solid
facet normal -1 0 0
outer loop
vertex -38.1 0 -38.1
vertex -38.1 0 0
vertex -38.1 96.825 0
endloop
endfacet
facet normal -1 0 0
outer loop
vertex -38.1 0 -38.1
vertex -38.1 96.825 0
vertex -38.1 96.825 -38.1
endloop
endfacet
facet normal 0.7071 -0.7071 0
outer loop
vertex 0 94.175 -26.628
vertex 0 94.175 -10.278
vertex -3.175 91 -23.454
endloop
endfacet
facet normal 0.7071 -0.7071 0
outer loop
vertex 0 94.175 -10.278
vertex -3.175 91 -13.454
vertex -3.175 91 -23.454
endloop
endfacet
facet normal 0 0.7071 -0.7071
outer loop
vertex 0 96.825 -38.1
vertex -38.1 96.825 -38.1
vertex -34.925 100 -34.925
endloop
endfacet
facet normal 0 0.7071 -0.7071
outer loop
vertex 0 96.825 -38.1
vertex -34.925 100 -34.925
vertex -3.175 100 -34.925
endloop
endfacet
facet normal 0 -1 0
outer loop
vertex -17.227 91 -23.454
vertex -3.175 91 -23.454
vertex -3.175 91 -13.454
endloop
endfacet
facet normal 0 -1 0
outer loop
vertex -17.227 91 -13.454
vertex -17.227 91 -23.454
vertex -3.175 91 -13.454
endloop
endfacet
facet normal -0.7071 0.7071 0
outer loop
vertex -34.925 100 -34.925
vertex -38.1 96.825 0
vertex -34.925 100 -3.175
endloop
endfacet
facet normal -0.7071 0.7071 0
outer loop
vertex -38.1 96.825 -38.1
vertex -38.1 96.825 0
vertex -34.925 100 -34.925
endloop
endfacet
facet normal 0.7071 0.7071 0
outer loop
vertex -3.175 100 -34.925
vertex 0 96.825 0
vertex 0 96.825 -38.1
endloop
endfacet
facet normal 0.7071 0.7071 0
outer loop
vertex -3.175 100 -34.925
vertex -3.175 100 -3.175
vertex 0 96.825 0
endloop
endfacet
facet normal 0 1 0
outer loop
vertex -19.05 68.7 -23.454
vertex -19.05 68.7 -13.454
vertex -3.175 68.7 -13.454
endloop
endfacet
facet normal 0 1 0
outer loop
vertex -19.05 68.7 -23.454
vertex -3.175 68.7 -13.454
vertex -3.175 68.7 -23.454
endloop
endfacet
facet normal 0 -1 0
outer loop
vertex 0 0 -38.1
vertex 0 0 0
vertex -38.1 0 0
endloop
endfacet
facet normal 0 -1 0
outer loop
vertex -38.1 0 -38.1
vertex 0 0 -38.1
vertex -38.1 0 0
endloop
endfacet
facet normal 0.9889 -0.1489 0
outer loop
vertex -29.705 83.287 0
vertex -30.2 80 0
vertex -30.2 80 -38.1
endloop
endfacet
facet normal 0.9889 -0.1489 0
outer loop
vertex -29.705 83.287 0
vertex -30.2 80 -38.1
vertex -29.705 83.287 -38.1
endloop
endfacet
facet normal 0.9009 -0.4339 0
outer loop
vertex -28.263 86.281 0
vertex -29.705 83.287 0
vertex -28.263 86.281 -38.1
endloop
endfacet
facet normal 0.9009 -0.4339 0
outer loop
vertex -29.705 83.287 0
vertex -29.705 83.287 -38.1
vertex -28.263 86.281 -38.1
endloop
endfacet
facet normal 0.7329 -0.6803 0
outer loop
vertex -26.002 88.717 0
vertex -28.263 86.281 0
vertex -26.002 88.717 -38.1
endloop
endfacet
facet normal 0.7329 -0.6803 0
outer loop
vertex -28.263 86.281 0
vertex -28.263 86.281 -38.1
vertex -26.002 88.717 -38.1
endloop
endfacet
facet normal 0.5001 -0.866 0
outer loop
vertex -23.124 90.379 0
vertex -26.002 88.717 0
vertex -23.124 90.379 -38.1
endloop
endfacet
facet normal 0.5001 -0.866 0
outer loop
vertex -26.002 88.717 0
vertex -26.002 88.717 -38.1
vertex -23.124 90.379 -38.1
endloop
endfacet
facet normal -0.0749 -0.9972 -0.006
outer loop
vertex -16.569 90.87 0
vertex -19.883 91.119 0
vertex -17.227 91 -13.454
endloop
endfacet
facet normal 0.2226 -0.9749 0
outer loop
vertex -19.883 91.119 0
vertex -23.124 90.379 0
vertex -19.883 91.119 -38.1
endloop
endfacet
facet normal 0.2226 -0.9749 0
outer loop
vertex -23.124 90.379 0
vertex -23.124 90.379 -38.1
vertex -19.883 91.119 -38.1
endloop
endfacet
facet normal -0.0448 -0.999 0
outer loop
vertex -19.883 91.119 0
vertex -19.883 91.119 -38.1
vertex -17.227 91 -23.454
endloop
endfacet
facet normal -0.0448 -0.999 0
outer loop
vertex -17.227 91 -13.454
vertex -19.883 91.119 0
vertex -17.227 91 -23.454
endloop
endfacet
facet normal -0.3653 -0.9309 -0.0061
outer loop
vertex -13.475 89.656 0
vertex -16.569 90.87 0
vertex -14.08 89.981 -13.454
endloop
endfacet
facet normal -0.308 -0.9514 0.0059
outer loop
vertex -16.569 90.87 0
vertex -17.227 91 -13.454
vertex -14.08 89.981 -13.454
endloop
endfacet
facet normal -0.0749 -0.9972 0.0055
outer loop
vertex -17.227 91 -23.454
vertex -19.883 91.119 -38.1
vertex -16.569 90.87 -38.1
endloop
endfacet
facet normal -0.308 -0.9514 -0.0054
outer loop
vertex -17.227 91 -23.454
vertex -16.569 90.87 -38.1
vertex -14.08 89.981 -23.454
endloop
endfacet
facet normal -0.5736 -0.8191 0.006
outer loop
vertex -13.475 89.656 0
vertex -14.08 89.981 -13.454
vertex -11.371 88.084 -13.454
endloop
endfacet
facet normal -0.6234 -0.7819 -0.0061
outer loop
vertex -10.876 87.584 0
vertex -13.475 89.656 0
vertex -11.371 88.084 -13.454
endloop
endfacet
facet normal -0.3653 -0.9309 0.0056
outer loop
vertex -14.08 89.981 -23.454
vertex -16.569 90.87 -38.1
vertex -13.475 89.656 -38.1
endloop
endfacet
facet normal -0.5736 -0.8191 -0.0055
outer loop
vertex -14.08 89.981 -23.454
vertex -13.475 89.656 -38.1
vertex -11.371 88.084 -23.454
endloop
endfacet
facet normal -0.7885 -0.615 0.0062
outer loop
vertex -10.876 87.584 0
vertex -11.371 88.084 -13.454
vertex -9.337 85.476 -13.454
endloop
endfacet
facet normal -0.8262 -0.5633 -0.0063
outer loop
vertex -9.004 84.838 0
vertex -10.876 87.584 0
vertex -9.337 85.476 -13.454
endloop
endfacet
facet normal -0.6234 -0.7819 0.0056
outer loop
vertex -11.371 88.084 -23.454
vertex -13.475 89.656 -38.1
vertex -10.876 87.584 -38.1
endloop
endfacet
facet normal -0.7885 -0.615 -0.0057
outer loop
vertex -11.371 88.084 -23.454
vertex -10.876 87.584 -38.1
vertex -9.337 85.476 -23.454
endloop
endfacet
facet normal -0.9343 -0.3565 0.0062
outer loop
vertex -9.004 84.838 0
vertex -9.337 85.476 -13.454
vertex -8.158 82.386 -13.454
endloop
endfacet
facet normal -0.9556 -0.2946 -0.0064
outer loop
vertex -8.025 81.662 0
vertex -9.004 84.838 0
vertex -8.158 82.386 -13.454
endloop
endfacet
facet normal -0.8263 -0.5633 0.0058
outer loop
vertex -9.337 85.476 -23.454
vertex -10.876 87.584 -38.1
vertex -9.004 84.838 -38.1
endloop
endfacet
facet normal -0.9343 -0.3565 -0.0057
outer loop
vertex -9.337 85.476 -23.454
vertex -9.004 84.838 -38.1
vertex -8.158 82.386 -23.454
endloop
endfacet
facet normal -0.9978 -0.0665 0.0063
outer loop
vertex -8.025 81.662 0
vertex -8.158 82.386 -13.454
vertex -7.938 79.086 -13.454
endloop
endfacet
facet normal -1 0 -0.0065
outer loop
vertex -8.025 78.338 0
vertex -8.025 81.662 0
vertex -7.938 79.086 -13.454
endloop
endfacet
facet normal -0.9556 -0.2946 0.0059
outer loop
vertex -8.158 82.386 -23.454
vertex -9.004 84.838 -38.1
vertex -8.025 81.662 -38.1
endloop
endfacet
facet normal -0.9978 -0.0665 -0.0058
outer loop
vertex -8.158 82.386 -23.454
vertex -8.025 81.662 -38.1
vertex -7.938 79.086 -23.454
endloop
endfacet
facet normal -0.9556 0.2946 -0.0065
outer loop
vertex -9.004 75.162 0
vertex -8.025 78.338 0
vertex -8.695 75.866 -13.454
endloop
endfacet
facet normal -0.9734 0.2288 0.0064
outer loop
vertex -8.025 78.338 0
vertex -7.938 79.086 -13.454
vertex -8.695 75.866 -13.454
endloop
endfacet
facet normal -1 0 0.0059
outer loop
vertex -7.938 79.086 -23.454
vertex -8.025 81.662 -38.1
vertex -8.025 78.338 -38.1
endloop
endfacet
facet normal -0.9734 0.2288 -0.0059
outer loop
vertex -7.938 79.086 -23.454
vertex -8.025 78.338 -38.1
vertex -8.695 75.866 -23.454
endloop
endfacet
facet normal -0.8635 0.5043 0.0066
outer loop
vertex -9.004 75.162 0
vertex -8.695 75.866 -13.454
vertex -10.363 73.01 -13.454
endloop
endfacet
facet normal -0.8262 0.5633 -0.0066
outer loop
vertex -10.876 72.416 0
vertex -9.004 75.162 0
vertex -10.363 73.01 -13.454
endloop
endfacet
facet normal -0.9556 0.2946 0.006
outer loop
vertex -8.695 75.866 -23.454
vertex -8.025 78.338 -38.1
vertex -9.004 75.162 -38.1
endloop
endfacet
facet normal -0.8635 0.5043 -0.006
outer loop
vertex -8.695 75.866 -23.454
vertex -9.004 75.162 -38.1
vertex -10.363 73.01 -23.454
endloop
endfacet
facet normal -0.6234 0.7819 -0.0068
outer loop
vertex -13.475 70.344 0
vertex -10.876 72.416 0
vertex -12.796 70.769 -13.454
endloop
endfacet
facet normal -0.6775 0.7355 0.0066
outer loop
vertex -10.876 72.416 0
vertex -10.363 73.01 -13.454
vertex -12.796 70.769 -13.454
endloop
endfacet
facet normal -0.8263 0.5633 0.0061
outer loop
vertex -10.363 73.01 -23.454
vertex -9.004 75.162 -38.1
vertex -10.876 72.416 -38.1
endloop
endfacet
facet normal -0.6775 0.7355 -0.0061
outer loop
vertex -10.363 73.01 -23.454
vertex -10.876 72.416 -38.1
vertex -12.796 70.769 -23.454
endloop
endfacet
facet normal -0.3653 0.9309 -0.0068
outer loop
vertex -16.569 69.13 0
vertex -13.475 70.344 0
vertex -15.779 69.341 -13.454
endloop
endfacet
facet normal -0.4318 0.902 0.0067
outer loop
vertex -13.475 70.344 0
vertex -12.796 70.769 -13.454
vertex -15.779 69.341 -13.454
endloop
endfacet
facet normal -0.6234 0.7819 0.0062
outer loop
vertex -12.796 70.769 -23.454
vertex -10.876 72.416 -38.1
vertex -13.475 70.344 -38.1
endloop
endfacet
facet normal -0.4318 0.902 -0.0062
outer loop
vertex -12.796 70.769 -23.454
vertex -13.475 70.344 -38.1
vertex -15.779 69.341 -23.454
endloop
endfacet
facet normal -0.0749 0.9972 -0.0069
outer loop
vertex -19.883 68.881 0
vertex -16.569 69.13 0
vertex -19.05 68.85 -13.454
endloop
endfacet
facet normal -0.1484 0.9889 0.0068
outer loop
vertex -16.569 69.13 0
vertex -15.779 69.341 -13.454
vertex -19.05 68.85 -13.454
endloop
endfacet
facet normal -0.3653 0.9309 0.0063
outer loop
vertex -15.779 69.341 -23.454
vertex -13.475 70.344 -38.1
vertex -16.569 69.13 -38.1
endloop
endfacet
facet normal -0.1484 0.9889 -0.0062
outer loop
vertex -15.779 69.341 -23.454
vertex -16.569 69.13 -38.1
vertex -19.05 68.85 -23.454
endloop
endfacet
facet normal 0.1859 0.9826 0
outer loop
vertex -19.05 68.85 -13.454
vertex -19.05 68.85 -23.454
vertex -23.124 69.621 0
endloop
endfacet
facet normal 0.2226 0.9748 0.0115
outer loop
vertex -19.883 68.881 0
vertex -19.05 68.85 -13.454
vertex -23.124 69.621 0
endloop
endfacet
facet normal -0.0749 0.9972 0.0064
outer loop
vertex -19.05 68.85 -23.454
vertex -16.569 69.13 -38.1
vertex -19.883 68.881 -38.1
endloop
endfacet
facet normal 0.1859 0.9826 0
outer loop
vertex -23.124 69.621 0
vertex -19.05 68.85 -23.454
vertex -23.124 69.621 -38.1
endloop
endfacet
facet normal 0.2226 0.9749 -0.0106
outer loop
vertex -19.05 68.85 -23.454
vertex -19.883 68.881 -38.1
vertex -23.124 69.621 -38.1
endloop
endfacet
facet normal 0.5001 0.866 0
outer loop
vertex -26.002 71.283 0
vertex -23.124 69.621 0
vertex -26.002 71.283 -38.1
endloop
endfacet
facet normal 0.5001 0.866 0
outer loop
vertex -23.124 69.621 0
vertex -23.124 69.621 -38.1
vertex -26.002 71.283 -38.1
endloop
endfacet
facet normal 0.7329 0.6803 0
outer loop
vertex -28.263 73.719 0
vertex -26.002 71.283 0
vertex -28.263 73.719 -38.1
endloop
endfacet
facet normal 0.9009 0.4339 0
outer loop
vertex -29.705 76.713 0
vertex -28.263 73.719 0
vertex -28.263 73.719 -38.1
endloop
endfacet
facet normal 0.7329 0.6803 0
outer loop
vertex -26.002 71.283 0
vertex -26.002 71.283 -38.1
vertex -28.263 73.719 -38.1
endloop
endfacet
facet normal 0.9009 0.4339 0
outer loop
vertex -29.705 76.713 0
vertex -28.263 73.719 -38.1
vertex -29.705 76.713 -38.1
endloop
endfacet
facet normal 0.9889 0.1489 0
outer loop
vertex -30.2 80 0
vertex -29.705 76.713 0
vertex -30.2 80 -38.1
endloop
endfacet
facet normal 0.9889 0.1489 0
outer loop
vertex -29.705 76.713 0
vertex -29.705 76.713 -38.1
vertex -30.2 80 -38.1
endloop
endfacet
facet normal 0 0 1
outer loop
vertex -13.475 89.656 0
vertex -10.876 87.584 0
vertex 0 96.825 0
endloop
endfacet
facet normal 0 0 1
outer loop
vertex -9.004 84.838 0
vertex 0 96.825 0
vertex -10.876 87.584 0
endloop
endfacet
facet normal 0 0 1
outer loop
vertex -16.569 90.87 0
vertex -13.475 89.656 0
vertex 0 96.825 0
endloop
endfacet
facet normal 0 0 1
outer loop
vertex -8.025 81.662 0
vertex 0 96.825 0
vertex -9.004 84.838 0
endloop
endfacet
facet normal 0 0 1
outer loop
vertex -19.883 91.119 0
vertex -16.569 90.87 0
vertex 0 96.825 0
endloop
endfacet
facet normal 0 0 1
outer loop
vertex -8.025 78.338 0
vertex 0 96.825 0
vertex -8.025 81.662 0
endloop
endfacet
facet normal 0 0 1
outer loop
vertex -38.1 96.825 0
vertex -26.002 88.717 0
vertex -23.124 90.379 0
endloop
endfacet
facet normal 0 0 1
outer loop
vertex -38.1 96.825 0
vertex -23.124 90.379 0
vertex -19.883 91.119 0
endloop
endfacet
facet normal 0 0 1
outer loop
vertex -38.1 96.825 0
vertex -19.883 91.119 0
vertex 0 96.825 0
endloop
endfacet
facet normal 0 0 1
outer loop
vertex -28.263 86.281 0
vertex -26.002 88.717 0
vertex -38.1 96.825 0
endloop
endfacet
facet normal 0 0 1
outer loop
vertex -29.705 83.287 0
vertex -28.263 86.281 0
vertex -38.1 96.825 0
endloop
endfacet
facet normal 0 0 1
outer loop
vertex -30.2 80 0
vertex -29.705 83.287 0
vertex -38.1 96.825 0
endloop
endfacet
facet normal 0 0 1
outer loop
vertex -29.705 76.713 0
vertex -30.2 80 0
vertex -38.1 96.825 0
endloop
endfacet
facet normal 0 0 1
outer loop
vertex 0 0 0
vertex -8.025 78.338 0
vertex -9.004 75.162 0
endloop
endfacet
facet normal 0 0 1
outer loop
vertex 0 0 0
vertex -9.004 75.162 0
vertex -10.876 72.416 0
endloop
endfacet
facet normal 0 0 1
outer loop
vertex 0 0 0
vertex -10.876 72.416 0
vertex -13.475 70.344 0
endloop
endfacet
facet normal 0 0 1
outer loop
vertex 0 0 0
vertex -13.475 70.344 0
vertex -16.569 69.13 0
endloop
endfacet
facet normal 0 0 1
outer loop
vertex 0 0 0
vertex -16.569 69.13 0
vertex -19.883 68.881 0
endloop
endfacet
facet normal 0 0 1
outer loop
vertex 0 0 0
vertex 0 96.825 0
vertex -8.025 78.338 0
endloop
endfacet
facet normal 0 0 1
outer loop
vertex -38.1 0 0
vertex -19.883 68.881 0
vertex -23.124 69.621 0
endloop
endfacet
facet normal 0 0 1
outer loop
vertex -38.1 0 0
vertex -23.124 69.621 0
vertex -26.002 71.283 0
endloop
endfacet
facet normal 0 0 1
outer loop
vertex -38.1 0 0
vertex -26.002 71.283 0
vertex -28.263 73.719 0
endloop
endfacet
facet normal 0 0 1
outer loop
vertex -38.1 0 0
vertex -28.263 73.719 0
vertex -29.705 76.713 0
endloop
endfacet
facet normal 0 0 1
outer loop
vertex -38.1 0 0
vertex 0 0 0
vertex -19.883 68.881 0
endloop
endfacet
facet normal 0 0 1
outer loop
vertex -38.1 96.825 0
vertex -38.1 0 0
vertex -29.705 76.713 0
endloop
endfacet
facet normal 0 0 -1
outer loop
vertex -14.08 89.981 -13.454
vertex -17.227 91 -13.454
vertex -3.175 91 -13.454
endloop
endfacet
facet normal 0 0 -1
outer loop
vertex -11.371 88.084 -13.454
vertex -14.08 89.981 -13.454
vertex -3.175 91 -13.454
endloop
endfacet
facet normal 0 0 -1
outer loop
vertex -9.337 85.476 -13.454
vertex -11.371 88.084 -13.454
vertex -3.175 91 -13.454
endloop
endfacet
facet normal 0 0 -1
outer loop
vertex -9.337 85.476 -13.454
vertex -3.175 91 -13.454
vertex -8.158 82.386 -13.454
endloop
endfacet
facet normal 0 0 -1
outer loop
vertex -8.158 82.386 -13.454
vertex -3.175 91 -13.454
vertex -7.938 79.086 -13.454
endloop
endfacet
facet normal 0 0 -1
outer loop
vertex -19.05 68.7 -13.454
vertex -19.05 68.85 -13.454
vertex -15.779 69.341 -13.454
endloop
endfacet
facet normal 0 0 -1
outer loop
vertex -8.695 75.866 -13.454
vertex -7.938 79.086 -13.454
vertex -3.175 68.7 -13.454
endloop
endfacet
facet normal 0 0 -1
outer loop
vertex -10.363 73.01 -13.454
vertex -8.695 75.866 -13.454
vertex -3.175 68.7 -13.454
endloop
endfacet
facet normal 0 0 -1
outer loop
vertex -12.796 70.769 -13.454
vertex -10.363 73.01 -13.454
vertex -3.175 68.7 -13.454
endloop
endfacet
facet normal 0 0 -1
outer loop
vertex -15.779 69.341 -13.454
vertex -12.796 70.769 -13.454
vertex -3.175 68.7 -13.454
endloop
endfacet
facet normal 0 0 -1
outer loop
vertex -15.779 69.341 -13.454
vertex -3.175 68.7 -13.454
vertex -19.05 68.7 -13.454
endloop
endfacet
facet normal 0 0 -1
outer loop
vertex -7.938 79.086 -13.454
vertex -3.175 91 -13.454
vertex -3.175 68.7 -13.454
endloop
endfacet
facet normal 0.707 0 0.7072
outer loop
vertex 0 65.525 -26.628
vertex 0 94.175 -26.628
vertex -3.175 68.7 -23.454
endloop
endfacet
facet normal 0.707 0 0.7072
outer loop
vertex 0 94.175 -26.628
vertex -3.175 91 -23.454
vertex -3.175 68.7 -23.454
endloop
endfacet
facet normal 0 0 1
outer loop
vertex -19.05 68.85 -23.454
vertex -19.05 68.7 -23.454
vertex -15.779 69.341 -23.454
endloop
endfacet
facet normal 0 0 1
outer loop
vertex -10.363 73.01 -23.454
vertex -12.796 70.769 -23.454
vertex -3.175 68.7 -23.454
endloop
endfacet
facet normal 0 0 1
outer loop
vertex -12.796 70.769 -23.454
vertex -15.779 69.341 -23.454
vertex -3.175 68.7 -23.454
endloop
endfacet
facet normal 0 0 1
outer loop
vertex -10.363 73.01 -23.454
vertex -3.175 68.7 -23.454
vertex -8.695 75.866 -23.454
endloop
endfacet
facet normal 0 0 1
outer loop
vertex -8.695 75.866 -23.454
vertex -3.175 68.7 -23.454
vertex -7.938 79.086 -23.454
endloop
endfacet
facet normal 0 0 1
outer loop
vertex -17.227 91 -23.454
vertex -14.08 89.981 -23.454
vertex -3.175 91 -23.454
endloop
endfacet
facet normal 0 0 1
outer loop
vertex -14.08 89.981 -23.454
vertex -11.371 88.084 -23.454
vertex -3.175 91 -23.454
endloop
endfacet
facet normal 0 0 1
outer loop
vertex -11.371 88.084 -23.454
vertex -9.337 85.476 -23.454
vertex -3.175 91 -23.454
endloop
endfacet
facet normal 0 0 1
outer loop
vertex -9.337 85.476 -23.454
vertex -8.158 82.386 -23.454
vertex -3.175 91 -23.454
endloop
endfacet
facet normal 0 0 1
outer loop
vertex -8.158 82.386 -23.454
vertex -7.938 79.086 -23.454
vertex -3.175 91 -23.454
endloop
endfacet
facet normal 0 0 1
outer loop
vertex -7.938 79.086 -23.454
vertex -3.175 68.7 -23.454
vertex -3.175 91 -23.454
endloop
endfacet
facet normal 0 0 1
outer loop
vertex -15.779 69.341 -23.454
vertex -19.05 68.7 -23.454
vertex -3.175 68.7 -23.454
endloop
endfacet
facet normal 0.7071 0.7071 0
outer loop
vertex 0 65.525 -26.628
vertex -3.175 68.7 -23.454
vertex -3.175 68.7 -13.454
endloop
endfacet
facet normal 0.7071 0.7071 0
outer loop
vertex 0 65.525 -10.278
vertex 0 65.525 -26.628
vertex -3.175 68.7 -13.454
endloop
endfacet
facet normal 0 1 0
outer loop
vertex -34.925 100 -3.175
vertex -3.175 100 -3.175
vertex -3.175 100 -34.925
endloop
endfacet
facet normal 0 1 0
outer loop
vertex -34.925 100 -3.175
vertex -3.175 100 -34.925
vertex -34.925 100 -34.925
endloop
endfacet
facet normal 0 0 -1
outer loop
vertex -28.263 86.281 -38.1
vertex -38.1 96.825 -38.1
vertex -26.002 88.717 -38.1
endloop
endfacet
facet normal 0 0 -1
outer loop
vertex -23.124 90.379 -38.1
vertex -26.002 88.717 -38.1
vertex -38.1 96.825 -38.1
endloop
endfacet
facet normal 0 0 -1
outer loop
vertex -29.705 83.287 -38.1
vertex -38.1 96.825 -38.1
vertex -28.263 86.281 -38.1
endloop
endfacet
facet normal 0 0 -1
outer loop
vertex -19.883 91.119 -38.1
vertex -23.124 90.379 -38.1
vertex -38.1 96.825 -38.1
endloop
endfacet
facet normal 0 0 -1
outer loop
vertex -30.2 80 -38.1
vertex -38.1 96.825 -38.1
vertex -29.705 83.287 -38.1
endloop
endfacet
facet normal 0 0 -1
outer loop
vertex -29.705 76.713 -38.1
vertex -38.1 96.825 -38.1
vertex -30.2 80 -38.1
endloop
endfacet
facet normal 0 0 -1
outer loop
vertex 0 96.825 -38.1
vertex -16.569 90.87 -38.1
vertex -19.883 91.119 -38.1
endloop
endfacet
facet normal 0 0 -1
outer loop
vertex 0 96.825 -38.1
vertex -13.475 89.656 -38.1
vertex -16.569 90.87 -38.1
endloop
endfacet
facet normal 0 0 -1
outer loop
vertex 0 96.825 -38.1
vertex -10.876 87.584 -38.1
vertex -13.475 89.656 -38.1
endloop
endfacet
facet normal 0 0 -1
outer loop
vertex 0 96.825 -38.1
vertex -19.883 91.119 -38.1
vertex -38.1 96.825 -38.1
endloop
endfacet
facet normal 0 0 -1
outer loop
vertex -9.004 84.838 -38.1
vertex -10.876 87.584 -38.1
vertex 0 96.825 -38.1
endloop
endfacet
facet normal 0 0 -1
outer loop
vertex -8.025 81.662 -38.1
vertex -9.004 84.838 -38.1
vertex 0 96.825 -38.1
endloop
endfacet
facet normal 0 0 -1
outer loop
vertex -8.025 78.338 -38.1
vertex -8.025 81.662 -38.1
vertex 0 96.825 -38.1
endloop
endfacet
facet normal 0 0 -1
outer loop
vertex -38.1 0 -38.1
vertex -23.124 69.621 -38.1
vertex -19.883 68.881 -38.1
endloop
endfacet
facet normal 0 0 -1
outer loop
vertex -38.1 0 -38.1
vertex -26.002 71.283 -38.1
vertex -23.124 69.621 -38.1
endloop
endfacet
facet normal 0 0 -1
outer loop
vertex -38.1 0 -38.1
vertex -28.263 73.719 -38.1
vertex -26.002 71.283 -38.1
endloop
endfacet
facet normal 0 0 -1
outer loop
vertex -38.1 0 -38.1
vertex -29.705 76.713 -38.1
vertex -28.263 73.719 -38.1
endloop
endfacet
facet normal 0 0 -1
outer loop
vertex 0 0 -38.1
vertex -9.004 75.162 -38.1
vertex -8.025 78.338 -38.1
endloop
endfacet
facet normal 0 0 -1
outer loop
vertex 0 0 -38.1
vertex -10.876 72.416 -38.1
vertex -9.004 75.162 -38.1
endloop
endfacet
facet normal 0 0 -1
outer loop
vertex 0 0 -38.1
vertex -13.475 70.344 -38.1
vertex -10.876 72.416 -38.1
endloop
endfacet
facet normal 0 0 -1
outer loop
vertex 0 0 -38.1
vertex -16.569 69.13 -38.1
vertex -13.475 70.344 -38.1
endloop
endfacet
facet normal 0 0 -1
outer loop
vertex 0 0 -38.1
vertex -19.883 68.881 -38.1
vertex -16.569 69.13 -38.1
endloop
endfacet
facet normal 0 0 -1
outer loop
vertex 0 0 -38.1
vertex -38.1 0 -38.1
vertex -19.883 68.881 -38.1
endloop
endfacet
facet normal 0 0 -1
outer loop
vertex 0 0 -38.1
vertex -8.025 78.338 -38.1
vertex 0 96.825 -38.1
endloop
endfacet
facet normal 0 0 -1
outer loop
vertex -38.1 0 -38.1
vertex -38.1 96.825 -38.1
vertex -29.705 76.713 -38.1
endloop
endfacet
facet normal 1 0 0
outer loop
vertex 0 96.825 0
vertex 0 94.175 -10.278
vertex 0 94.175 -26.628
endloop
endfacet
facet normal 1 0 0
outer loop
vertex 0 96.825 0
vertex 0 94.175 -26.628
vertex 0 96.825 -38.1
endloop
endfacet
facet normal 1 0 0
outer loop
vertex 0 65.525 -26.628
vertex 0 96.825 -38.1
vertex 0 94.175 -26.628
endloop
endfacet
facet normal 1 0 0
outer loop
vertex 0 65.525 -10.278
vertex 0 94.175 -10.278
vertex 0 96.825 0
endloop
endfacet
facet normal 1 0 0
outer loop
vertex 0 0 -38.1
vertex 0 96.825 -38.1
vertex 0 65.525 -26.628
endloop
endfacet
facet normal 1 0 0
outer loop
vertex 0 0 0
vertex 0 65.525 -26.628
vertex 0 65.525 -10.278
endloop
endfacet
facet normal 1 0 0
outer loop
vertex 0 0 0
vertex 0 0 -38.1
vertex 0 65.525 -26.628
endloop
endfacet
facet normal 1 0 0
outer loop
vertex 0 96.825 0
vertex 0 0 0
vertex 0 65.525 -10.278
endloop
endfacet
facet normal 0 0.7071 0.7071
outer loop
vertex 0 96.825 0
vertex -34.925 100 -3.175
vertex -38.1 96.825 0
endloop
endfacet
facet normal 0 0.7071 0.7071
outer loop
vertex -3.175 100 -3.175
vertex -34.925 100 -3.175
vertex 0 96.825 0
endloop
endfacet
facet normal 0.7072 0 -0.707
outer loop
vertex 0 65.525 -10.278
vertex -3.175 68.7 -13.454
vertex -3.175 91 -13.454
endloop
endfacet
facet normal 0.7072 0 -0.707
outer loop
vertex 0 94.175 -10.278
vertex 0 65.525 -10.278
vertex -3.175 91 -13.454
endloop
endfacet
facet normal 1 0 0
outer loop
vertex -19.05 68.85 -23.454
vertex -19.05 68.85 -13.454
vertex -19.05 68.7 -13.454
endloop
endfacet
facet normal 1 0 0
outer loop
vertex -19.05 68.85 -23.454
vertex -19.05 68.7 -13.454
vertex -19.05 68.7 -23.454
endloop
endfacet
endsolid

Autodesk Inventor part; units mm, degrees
ref_plane "YZ Plane" through (0, 0, 0) normal (1, 0, 0) x (0, 1, 0)
ref_plane "XZ Plane" through (0, 0, 0) normal (0, 1, 0) x (-1, 0, 0)
ref_plane "XY Plane" through (0, 0, 0) normal (0, 0, 1) x (1, 0, 0)
sketch "Sketch1" plane through (0, 0, 0) normal (0, 1, 0) x (-1, 0, 0)
  line L0 (0, 0) -> (38.1, 0)
  line L1 (38.1, 0) -> (38.1, -38.1)
  line L2 (38.1, -38.1) -> (0, -38.1)
  line L3 (0, -38.1) -> (0, 0)
  dimension "d0" = 38.1
  dimension "d1" = 38.1
extrude "Extrusion1" add sketch "Sketch1" along normal blind 100
sketch "Sketch2" plane through (0, 0, -38.1) normal (0, 0, -1) x (-1, 0, 0)
  circle A0 centre (19.05, 80) radius 11.15
  line L0 (0, 100) -> (38.1, 100) projected
  line L1 (0, 0) -> (0, 100) projected
  dimension "d4" = 22.3
  dimension "d5" = 20
  dimension "d6" = 19.05
sketch "Sketch3" plane through (0, 0, -38.1) normal (0, 0, -1) x (-1, 0, 0)
  point P0 (0, 0)
extrude "Extrusion2" cut sketch "Sketch2" against normal blind 38.1
sketch "Sketch4" plane through (0, 0, 0) normal (1, 0, 0) x (0, 0, -1)
  line L0 (13.4535, 68.7) -> (23.4535, 68.7)
  line L1 (23.4535, 68.7) -> (23.4535, 91)
  line L2 (23.4535, 91) -> (13.4535, 91)
  line L3 (13.4535, 91) -> (13.4535, 68.7)
  line L4 (13.4535, 68.7) -> (23.4535, 91) construction
  line L5 (23.4535, 68.7) -> (13.4535, 91) construction
  line L6 (0, 100) -> (38.1, 100) projected
  point P0 (0, 0)
  point P1 (18.4535, 79.85)
  dimension "d9" = 10
  dimension "d10" = 22.3
  dimension "d11" = 9
extrude "Extrusion3" cut sketch "Sketch4" against normal blind 19.05
chamfer "Chamfer1" distance 3.175 angle 45 8 edges at (0, 91, -18.4535) (0, 68.7, -18.4535) (0, 79.85, -13.4535) (0, 79.85, -23.4535) (0, 100, -19.05) (-19.05, 100, -38.1) (-38.1, 100, -19.05) (-19.05, 100, 0)
properties part number "XTower"
